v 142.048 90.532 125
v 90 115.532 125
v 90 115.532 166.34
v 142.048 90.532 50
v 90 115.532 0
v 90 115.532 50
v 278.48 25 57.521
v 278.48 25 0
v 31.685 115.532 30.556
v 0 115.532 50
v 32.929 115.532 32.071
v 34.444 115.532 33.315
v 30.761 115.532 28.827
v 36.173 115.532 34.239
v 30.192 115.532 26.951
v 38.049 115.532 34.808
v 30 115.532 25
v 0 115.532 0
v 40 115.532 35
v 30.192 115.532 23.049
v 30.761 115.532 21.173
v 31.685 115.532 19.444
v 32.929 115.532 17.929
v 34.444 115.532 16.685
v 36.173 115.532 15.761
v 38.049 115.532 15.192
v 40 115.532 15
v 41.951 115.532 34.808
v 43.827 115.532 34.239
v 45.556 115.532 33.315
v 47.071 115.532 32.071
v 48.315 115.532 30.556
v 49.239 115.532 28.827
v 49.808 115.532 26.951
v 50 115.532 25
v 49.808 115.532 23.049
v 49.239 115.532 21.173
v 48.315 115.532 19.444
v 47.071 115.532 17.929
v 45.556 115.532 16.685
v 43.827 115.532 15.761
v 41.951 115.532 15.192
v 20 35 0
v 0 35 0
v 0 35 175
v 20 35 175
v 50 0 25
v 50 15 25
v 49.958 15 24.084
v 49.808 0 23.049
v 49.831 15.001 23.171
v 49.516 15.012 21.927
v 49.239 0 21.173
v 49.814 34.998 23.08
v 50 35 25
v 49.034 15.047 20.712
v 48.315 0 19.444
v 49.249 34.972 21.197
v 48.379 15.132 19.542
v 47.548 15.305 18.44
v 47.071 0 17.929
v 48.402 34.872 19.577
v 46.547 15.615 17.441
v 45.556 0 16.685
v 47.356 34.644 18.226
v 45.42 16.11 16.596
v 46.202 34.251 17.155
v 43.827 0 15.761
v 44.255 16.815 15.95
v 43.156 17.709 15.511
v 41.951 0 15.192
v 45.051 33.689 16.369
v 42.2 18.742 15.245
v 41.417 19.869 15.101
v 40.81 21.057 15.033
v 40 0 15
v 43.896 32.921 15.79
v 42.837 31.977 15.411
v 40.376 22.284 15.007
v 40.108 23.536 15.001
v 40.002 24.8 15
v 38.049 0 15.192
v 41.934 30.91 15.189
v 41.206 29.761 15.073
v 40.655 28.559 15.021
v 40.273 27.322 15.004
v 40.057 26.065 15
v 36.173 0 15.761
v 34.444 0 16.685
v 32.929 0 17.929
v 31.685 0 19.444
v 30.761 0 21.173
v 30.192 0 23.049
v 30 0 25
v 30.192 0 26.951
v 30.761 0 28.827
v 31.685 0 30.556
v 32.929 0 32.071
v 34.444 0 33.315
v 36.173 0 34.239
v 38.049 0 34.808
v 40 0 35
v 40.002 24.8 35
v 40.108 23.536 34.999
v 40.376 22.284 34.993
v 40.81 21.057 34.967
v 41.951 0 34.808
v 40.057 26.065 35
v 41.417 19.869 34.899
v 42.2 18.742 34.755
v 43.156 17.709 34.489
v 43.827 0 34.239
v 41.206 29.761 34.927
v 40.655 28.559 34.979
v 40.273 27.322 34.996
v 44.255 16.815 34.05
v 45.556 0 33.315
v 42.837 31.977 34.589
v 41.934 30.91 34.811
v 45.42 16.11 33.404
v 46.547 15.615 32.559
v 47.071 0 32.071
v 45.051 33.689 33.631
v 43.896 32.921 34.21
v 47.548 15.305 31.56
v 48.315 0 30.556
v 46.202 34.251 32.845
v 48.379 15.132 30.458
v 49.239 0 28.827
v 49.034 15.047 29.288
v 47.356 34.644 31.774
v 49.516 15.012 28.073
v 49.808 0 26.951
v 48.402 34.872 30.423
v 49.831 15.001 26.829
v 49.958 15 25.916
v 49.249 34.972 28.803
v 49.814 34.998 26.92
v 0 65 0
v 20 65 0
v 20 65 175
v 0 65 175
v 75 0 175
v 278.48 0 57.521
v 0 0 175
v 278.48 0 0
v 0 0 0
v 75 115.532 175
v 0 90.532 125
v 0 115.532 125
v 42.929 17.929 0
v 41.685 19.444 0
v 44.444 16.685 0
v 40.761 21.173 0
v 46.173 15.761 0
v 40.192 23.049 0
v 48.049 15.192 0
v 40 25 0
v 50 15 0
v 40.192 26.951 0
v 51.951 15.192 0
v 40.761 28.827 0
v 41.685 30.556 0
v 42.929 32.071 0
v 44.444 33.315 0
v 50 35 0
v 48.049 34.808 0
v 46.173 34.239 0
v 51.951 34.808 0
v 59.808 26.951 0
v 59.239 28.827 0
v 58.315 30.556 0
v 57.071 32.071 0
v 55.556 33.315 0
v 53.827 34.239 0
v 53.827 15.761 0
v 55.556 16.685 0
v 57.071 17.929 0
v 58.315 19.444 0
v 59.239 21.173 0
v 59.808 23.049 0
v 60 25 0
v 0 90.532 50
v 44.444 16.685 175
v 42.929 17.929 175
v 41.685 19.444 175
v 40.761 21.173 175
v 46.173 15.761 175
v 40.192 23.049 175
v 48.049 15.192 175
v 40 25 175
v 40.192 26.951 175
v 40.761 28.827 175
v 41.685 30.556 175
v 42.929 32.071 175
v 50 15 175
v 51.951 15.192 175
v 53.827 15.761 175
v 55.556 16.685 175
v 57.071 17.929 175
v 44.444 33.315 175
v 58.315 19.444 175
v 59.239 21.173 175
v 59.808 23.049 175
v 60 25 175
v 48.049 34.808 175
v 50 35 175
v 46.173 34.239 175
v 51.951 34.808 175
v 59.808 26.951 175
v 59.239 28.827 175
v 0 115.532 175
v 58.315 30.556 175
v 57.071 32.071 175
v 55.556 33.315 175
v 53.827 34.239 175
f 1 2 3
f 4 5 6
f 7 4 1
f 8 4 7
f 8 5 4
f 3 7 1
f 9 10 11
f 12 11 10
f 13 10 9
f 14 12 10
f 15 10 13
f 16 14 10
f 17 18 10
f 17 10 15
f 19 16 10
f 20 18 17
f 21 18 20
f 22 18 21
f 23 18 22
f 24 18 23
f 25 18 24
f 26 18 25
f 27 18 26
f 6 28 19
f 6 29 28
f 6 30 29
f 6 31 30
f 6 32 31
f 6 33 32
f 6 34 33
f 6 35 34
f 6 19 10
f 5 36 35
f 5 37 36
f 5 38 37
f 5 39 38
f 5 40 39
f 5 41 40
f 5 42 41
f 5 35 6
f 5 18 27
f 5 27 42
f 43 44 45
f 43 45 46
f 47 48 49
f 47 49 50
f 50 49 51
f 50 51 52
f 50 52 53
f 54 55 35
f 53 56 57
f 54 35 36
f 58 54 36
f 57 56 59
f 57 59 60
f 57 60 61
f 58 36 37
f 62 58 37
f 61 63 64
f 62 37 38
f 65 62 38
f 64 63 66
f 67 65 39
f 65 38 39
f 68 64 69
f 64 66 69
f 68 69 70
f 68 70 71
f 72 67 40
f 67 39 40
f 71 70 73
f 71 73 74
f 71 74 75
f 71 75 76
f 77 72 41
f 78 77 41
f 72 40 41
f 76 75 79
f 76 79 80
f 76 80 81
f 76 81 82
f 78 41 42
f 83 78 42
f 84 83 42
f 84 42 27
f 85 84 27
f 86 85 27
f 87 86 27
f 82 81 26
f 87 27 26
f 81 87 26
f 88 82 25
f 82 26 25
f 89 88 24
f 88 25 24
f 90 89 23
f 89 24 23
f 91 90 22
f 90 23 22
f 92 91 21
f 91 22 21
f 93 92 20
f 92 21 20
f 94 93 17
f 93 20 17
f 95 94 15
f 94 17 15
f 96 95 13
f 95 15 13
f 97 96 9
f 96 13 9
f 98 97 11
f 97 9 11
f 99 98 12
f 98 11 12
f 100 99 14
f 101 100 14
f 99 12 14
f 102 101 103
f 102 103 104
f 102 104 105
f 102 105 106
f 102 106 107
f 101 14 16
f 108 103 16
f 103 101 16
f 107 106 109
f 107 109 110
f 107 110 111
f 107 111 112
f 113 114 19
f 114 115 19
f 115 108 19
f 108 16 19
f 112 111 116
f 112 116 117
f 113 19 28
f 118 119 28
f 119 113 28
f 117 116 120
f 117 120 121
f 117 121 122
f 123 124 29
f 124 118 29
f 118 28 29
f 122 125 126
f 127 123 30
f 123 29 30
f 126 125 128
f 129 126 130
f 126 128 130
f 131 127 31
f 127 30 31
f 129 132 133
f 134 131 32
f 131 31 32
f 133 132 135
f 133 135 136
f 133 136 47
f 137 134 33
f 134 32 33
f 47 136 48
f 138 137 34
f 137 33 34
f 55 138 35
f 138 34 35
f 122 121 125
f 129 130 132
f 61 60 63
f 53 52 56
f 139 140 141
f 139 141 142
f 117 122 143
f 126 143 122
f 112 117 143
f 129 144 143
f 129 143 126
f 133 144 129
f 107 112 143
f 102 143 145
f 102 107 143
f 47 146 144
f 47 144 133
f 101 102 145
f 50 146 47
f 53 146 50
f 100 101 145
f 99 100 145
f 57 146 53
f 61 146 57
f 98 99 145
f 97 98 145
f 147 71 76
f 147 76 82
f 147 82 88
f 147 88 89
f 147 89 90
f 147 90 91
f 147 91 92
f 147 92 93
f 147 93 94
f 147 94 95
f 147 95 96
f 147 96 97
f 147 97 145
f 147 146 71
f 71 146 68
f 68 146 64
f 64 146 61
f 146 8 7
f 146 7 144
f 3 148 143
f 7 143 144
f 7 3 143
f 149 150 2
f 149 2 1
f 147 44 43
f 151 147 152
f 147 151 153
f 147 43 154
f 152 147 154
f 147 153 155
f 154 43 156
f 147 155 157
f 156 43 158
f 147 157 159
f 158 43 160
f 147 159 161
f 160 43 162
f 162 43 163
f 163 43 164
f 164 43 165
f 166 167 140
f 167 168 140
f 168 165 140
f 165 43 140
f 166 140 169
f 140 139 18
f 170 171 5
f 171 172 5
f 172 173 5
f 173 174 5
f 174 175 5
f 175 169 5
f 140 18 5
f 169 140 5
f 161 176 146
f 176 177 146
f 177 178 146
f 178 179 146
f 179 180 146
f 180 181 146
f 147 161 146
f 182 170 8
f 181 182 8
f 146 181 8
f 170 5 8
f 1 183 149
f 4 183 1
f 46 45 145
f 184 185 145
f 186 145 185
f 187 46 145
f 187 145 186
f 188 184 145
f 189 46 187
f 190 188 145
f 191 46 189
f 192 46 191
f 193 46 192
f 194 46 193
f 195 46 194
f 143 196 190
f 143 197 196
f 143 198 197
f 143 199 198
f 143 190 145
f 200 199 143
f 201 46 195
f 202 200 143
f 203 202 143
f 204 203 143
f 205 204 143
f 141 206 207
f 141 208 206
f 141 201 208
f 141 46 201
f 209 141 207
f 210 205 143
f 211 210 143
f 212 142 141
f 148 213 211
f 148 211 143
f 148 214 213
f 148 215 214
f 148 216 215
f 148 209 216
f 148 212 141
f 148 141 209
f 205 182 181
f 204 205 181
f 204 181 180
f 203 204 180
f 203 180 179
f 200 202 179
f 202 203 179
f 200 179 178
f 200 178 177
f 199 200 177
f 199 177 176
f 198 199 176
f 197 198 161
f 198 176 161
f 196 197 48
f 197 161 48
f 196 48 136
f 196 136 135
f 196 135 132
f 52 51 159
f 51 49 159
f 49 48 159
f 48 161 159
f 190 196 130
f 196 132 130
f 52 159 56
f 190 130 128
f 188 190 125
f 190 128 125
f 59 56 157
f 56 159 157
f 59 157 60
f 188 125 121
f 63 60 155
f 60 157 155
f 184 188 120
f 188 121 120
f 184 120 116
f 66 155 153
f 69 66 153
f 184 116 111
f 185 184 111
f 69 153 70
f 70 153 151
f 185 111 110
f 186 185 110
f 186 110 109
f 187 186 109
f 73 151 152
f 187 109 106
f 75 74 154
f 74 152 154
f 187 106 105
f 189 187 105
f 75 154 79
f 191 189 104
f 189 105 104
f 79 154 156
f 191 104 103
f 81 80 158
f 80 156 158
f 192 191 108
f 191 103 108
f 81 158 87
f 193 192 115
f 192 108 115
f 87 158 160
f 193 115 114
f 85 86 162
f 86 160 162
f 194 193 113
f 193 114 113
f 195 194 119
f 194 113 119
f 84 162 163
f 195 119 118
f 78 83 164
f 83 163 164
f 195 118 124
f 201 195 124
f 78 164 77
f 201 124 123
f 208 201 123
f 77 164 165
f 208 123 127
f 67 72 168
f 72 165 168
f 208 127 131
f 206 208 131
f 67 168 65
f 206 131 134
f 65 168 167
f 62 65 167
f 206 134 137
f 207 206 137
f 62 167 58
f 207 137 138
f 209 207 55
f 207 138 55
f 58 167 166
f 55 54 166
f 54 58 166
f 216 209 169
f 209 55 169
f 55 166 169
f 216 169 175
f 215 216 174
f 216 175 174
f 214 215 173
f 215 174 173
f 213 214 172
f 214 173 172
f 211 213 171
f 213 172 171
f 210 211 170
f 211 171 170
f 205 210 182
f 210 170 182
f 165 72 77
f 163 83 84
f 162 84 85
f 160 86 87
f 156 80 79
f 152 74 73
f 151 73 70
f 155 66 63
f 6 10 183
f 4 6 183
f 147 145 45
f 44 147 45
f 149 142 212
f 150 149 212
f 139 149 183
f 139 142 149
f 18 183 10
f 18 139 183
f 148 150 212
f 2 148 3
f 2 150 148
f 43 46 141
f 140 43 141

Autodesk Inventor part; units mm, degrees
ref_plane "YZ Plane" through (0, 0, 0) normal (1, 0, 0) x (0, 1, 0)
ref_plane "XZ Plane" through (0, 0, 0) normal (0, 1, 0) x (-1, 0, 0)
ref_plane "XY Plane" through (0, 0, 0) normal (0, 0, 1) x (1, 0, 0)
sketch "Sketch1" plane through (0, 0, 0) normal (0, 0, 1) x (1, 0, 0)
  line L0 (0, 0) -> (0, 35)
  line L1 (0, 35) -> (20, 35)
  line L2 (20, 35) -> (20, 65)
  line L3 (20, 65) -> (0, 65)
  line L4 (0, 65) -> (0, 115.5325)
  line L5 (0, 115.5325) -> (90, 115.5325)
  line L6 (90, 115.5325) -> (278.4804, 25)
  line L7 (278.4804, 25) -> (278.4804, 0)
  line L8 (278.4804, 0) -> (0, 0)
  circle A0 centre (50, 25) radius 10
  dimension "d0" = 35
  dimension "d1" = 20
  dimension "d2" = 30
  dimension "d3" = 20
  dimension "d4" = 90
  dimension "d5" = 20
  dimension "d6" = 25
  dimension "d7" = 50
  dimension "d23" = 25
extrude "Extrusion1" add sketch "Sketch1" along normal blind 175
sketch "Sketch2" plane through (0, 115.5325, 0) normal (0, 1, 0) x (1, 0, 0)
  circle A0 centre (40, -25) radius 10
  line L0 (0, 0) -> (90, 0) projected
  line L1 (0, 0) -> (0, -175) projected
  dimension "d10" = 20
  dimension "d11" = 25
  dimension "d12" = 40
extrude "Extrusion2" cut sketch "Sketch2" against normal through all
sketch "Sketch3" plane through (0, 115.5325, 0) normal (0, 1, 0) x (1, 0, 0)
  line L0 (0, -50) -> (195.2781, -50)
  line L1 (0, 0) -> (90, 0) projected
  line L2 (0, 0) -> (0, -175) projected
  line L3 (0, -125) -> (195.2781, -125)
  line L4 (195.2781, -125) -> (195.2781, -50)
  line L5 (0, -125) -> (0, -50)
  dimension "d15" = 50
  dimension "d16" = 75
extrude "Extrusion3" cut sketch "Sketch3" against normal blind 25
sketch "Sketch4" plane through (0, 115.5325, 175) normal (0, 1, 0) x (1, 0, 0)
  line L0 (0, 0) -> (278.4804, 0) projected
  line L1 (75, 0) -> (320.0389, 141.4733)
  line L2 (320.0389, 141.4733) -> (320.0389, 0)
  line L3 (320.0389, 0) -> (75, 0)
  point P0 (0, 175)
  dimension "d19" = 75
  dimension "d20" = 30
extrude "Extrusion4" cut sketch "Sketch4" against normal through all
properties part number "HW 2 Part 3"
